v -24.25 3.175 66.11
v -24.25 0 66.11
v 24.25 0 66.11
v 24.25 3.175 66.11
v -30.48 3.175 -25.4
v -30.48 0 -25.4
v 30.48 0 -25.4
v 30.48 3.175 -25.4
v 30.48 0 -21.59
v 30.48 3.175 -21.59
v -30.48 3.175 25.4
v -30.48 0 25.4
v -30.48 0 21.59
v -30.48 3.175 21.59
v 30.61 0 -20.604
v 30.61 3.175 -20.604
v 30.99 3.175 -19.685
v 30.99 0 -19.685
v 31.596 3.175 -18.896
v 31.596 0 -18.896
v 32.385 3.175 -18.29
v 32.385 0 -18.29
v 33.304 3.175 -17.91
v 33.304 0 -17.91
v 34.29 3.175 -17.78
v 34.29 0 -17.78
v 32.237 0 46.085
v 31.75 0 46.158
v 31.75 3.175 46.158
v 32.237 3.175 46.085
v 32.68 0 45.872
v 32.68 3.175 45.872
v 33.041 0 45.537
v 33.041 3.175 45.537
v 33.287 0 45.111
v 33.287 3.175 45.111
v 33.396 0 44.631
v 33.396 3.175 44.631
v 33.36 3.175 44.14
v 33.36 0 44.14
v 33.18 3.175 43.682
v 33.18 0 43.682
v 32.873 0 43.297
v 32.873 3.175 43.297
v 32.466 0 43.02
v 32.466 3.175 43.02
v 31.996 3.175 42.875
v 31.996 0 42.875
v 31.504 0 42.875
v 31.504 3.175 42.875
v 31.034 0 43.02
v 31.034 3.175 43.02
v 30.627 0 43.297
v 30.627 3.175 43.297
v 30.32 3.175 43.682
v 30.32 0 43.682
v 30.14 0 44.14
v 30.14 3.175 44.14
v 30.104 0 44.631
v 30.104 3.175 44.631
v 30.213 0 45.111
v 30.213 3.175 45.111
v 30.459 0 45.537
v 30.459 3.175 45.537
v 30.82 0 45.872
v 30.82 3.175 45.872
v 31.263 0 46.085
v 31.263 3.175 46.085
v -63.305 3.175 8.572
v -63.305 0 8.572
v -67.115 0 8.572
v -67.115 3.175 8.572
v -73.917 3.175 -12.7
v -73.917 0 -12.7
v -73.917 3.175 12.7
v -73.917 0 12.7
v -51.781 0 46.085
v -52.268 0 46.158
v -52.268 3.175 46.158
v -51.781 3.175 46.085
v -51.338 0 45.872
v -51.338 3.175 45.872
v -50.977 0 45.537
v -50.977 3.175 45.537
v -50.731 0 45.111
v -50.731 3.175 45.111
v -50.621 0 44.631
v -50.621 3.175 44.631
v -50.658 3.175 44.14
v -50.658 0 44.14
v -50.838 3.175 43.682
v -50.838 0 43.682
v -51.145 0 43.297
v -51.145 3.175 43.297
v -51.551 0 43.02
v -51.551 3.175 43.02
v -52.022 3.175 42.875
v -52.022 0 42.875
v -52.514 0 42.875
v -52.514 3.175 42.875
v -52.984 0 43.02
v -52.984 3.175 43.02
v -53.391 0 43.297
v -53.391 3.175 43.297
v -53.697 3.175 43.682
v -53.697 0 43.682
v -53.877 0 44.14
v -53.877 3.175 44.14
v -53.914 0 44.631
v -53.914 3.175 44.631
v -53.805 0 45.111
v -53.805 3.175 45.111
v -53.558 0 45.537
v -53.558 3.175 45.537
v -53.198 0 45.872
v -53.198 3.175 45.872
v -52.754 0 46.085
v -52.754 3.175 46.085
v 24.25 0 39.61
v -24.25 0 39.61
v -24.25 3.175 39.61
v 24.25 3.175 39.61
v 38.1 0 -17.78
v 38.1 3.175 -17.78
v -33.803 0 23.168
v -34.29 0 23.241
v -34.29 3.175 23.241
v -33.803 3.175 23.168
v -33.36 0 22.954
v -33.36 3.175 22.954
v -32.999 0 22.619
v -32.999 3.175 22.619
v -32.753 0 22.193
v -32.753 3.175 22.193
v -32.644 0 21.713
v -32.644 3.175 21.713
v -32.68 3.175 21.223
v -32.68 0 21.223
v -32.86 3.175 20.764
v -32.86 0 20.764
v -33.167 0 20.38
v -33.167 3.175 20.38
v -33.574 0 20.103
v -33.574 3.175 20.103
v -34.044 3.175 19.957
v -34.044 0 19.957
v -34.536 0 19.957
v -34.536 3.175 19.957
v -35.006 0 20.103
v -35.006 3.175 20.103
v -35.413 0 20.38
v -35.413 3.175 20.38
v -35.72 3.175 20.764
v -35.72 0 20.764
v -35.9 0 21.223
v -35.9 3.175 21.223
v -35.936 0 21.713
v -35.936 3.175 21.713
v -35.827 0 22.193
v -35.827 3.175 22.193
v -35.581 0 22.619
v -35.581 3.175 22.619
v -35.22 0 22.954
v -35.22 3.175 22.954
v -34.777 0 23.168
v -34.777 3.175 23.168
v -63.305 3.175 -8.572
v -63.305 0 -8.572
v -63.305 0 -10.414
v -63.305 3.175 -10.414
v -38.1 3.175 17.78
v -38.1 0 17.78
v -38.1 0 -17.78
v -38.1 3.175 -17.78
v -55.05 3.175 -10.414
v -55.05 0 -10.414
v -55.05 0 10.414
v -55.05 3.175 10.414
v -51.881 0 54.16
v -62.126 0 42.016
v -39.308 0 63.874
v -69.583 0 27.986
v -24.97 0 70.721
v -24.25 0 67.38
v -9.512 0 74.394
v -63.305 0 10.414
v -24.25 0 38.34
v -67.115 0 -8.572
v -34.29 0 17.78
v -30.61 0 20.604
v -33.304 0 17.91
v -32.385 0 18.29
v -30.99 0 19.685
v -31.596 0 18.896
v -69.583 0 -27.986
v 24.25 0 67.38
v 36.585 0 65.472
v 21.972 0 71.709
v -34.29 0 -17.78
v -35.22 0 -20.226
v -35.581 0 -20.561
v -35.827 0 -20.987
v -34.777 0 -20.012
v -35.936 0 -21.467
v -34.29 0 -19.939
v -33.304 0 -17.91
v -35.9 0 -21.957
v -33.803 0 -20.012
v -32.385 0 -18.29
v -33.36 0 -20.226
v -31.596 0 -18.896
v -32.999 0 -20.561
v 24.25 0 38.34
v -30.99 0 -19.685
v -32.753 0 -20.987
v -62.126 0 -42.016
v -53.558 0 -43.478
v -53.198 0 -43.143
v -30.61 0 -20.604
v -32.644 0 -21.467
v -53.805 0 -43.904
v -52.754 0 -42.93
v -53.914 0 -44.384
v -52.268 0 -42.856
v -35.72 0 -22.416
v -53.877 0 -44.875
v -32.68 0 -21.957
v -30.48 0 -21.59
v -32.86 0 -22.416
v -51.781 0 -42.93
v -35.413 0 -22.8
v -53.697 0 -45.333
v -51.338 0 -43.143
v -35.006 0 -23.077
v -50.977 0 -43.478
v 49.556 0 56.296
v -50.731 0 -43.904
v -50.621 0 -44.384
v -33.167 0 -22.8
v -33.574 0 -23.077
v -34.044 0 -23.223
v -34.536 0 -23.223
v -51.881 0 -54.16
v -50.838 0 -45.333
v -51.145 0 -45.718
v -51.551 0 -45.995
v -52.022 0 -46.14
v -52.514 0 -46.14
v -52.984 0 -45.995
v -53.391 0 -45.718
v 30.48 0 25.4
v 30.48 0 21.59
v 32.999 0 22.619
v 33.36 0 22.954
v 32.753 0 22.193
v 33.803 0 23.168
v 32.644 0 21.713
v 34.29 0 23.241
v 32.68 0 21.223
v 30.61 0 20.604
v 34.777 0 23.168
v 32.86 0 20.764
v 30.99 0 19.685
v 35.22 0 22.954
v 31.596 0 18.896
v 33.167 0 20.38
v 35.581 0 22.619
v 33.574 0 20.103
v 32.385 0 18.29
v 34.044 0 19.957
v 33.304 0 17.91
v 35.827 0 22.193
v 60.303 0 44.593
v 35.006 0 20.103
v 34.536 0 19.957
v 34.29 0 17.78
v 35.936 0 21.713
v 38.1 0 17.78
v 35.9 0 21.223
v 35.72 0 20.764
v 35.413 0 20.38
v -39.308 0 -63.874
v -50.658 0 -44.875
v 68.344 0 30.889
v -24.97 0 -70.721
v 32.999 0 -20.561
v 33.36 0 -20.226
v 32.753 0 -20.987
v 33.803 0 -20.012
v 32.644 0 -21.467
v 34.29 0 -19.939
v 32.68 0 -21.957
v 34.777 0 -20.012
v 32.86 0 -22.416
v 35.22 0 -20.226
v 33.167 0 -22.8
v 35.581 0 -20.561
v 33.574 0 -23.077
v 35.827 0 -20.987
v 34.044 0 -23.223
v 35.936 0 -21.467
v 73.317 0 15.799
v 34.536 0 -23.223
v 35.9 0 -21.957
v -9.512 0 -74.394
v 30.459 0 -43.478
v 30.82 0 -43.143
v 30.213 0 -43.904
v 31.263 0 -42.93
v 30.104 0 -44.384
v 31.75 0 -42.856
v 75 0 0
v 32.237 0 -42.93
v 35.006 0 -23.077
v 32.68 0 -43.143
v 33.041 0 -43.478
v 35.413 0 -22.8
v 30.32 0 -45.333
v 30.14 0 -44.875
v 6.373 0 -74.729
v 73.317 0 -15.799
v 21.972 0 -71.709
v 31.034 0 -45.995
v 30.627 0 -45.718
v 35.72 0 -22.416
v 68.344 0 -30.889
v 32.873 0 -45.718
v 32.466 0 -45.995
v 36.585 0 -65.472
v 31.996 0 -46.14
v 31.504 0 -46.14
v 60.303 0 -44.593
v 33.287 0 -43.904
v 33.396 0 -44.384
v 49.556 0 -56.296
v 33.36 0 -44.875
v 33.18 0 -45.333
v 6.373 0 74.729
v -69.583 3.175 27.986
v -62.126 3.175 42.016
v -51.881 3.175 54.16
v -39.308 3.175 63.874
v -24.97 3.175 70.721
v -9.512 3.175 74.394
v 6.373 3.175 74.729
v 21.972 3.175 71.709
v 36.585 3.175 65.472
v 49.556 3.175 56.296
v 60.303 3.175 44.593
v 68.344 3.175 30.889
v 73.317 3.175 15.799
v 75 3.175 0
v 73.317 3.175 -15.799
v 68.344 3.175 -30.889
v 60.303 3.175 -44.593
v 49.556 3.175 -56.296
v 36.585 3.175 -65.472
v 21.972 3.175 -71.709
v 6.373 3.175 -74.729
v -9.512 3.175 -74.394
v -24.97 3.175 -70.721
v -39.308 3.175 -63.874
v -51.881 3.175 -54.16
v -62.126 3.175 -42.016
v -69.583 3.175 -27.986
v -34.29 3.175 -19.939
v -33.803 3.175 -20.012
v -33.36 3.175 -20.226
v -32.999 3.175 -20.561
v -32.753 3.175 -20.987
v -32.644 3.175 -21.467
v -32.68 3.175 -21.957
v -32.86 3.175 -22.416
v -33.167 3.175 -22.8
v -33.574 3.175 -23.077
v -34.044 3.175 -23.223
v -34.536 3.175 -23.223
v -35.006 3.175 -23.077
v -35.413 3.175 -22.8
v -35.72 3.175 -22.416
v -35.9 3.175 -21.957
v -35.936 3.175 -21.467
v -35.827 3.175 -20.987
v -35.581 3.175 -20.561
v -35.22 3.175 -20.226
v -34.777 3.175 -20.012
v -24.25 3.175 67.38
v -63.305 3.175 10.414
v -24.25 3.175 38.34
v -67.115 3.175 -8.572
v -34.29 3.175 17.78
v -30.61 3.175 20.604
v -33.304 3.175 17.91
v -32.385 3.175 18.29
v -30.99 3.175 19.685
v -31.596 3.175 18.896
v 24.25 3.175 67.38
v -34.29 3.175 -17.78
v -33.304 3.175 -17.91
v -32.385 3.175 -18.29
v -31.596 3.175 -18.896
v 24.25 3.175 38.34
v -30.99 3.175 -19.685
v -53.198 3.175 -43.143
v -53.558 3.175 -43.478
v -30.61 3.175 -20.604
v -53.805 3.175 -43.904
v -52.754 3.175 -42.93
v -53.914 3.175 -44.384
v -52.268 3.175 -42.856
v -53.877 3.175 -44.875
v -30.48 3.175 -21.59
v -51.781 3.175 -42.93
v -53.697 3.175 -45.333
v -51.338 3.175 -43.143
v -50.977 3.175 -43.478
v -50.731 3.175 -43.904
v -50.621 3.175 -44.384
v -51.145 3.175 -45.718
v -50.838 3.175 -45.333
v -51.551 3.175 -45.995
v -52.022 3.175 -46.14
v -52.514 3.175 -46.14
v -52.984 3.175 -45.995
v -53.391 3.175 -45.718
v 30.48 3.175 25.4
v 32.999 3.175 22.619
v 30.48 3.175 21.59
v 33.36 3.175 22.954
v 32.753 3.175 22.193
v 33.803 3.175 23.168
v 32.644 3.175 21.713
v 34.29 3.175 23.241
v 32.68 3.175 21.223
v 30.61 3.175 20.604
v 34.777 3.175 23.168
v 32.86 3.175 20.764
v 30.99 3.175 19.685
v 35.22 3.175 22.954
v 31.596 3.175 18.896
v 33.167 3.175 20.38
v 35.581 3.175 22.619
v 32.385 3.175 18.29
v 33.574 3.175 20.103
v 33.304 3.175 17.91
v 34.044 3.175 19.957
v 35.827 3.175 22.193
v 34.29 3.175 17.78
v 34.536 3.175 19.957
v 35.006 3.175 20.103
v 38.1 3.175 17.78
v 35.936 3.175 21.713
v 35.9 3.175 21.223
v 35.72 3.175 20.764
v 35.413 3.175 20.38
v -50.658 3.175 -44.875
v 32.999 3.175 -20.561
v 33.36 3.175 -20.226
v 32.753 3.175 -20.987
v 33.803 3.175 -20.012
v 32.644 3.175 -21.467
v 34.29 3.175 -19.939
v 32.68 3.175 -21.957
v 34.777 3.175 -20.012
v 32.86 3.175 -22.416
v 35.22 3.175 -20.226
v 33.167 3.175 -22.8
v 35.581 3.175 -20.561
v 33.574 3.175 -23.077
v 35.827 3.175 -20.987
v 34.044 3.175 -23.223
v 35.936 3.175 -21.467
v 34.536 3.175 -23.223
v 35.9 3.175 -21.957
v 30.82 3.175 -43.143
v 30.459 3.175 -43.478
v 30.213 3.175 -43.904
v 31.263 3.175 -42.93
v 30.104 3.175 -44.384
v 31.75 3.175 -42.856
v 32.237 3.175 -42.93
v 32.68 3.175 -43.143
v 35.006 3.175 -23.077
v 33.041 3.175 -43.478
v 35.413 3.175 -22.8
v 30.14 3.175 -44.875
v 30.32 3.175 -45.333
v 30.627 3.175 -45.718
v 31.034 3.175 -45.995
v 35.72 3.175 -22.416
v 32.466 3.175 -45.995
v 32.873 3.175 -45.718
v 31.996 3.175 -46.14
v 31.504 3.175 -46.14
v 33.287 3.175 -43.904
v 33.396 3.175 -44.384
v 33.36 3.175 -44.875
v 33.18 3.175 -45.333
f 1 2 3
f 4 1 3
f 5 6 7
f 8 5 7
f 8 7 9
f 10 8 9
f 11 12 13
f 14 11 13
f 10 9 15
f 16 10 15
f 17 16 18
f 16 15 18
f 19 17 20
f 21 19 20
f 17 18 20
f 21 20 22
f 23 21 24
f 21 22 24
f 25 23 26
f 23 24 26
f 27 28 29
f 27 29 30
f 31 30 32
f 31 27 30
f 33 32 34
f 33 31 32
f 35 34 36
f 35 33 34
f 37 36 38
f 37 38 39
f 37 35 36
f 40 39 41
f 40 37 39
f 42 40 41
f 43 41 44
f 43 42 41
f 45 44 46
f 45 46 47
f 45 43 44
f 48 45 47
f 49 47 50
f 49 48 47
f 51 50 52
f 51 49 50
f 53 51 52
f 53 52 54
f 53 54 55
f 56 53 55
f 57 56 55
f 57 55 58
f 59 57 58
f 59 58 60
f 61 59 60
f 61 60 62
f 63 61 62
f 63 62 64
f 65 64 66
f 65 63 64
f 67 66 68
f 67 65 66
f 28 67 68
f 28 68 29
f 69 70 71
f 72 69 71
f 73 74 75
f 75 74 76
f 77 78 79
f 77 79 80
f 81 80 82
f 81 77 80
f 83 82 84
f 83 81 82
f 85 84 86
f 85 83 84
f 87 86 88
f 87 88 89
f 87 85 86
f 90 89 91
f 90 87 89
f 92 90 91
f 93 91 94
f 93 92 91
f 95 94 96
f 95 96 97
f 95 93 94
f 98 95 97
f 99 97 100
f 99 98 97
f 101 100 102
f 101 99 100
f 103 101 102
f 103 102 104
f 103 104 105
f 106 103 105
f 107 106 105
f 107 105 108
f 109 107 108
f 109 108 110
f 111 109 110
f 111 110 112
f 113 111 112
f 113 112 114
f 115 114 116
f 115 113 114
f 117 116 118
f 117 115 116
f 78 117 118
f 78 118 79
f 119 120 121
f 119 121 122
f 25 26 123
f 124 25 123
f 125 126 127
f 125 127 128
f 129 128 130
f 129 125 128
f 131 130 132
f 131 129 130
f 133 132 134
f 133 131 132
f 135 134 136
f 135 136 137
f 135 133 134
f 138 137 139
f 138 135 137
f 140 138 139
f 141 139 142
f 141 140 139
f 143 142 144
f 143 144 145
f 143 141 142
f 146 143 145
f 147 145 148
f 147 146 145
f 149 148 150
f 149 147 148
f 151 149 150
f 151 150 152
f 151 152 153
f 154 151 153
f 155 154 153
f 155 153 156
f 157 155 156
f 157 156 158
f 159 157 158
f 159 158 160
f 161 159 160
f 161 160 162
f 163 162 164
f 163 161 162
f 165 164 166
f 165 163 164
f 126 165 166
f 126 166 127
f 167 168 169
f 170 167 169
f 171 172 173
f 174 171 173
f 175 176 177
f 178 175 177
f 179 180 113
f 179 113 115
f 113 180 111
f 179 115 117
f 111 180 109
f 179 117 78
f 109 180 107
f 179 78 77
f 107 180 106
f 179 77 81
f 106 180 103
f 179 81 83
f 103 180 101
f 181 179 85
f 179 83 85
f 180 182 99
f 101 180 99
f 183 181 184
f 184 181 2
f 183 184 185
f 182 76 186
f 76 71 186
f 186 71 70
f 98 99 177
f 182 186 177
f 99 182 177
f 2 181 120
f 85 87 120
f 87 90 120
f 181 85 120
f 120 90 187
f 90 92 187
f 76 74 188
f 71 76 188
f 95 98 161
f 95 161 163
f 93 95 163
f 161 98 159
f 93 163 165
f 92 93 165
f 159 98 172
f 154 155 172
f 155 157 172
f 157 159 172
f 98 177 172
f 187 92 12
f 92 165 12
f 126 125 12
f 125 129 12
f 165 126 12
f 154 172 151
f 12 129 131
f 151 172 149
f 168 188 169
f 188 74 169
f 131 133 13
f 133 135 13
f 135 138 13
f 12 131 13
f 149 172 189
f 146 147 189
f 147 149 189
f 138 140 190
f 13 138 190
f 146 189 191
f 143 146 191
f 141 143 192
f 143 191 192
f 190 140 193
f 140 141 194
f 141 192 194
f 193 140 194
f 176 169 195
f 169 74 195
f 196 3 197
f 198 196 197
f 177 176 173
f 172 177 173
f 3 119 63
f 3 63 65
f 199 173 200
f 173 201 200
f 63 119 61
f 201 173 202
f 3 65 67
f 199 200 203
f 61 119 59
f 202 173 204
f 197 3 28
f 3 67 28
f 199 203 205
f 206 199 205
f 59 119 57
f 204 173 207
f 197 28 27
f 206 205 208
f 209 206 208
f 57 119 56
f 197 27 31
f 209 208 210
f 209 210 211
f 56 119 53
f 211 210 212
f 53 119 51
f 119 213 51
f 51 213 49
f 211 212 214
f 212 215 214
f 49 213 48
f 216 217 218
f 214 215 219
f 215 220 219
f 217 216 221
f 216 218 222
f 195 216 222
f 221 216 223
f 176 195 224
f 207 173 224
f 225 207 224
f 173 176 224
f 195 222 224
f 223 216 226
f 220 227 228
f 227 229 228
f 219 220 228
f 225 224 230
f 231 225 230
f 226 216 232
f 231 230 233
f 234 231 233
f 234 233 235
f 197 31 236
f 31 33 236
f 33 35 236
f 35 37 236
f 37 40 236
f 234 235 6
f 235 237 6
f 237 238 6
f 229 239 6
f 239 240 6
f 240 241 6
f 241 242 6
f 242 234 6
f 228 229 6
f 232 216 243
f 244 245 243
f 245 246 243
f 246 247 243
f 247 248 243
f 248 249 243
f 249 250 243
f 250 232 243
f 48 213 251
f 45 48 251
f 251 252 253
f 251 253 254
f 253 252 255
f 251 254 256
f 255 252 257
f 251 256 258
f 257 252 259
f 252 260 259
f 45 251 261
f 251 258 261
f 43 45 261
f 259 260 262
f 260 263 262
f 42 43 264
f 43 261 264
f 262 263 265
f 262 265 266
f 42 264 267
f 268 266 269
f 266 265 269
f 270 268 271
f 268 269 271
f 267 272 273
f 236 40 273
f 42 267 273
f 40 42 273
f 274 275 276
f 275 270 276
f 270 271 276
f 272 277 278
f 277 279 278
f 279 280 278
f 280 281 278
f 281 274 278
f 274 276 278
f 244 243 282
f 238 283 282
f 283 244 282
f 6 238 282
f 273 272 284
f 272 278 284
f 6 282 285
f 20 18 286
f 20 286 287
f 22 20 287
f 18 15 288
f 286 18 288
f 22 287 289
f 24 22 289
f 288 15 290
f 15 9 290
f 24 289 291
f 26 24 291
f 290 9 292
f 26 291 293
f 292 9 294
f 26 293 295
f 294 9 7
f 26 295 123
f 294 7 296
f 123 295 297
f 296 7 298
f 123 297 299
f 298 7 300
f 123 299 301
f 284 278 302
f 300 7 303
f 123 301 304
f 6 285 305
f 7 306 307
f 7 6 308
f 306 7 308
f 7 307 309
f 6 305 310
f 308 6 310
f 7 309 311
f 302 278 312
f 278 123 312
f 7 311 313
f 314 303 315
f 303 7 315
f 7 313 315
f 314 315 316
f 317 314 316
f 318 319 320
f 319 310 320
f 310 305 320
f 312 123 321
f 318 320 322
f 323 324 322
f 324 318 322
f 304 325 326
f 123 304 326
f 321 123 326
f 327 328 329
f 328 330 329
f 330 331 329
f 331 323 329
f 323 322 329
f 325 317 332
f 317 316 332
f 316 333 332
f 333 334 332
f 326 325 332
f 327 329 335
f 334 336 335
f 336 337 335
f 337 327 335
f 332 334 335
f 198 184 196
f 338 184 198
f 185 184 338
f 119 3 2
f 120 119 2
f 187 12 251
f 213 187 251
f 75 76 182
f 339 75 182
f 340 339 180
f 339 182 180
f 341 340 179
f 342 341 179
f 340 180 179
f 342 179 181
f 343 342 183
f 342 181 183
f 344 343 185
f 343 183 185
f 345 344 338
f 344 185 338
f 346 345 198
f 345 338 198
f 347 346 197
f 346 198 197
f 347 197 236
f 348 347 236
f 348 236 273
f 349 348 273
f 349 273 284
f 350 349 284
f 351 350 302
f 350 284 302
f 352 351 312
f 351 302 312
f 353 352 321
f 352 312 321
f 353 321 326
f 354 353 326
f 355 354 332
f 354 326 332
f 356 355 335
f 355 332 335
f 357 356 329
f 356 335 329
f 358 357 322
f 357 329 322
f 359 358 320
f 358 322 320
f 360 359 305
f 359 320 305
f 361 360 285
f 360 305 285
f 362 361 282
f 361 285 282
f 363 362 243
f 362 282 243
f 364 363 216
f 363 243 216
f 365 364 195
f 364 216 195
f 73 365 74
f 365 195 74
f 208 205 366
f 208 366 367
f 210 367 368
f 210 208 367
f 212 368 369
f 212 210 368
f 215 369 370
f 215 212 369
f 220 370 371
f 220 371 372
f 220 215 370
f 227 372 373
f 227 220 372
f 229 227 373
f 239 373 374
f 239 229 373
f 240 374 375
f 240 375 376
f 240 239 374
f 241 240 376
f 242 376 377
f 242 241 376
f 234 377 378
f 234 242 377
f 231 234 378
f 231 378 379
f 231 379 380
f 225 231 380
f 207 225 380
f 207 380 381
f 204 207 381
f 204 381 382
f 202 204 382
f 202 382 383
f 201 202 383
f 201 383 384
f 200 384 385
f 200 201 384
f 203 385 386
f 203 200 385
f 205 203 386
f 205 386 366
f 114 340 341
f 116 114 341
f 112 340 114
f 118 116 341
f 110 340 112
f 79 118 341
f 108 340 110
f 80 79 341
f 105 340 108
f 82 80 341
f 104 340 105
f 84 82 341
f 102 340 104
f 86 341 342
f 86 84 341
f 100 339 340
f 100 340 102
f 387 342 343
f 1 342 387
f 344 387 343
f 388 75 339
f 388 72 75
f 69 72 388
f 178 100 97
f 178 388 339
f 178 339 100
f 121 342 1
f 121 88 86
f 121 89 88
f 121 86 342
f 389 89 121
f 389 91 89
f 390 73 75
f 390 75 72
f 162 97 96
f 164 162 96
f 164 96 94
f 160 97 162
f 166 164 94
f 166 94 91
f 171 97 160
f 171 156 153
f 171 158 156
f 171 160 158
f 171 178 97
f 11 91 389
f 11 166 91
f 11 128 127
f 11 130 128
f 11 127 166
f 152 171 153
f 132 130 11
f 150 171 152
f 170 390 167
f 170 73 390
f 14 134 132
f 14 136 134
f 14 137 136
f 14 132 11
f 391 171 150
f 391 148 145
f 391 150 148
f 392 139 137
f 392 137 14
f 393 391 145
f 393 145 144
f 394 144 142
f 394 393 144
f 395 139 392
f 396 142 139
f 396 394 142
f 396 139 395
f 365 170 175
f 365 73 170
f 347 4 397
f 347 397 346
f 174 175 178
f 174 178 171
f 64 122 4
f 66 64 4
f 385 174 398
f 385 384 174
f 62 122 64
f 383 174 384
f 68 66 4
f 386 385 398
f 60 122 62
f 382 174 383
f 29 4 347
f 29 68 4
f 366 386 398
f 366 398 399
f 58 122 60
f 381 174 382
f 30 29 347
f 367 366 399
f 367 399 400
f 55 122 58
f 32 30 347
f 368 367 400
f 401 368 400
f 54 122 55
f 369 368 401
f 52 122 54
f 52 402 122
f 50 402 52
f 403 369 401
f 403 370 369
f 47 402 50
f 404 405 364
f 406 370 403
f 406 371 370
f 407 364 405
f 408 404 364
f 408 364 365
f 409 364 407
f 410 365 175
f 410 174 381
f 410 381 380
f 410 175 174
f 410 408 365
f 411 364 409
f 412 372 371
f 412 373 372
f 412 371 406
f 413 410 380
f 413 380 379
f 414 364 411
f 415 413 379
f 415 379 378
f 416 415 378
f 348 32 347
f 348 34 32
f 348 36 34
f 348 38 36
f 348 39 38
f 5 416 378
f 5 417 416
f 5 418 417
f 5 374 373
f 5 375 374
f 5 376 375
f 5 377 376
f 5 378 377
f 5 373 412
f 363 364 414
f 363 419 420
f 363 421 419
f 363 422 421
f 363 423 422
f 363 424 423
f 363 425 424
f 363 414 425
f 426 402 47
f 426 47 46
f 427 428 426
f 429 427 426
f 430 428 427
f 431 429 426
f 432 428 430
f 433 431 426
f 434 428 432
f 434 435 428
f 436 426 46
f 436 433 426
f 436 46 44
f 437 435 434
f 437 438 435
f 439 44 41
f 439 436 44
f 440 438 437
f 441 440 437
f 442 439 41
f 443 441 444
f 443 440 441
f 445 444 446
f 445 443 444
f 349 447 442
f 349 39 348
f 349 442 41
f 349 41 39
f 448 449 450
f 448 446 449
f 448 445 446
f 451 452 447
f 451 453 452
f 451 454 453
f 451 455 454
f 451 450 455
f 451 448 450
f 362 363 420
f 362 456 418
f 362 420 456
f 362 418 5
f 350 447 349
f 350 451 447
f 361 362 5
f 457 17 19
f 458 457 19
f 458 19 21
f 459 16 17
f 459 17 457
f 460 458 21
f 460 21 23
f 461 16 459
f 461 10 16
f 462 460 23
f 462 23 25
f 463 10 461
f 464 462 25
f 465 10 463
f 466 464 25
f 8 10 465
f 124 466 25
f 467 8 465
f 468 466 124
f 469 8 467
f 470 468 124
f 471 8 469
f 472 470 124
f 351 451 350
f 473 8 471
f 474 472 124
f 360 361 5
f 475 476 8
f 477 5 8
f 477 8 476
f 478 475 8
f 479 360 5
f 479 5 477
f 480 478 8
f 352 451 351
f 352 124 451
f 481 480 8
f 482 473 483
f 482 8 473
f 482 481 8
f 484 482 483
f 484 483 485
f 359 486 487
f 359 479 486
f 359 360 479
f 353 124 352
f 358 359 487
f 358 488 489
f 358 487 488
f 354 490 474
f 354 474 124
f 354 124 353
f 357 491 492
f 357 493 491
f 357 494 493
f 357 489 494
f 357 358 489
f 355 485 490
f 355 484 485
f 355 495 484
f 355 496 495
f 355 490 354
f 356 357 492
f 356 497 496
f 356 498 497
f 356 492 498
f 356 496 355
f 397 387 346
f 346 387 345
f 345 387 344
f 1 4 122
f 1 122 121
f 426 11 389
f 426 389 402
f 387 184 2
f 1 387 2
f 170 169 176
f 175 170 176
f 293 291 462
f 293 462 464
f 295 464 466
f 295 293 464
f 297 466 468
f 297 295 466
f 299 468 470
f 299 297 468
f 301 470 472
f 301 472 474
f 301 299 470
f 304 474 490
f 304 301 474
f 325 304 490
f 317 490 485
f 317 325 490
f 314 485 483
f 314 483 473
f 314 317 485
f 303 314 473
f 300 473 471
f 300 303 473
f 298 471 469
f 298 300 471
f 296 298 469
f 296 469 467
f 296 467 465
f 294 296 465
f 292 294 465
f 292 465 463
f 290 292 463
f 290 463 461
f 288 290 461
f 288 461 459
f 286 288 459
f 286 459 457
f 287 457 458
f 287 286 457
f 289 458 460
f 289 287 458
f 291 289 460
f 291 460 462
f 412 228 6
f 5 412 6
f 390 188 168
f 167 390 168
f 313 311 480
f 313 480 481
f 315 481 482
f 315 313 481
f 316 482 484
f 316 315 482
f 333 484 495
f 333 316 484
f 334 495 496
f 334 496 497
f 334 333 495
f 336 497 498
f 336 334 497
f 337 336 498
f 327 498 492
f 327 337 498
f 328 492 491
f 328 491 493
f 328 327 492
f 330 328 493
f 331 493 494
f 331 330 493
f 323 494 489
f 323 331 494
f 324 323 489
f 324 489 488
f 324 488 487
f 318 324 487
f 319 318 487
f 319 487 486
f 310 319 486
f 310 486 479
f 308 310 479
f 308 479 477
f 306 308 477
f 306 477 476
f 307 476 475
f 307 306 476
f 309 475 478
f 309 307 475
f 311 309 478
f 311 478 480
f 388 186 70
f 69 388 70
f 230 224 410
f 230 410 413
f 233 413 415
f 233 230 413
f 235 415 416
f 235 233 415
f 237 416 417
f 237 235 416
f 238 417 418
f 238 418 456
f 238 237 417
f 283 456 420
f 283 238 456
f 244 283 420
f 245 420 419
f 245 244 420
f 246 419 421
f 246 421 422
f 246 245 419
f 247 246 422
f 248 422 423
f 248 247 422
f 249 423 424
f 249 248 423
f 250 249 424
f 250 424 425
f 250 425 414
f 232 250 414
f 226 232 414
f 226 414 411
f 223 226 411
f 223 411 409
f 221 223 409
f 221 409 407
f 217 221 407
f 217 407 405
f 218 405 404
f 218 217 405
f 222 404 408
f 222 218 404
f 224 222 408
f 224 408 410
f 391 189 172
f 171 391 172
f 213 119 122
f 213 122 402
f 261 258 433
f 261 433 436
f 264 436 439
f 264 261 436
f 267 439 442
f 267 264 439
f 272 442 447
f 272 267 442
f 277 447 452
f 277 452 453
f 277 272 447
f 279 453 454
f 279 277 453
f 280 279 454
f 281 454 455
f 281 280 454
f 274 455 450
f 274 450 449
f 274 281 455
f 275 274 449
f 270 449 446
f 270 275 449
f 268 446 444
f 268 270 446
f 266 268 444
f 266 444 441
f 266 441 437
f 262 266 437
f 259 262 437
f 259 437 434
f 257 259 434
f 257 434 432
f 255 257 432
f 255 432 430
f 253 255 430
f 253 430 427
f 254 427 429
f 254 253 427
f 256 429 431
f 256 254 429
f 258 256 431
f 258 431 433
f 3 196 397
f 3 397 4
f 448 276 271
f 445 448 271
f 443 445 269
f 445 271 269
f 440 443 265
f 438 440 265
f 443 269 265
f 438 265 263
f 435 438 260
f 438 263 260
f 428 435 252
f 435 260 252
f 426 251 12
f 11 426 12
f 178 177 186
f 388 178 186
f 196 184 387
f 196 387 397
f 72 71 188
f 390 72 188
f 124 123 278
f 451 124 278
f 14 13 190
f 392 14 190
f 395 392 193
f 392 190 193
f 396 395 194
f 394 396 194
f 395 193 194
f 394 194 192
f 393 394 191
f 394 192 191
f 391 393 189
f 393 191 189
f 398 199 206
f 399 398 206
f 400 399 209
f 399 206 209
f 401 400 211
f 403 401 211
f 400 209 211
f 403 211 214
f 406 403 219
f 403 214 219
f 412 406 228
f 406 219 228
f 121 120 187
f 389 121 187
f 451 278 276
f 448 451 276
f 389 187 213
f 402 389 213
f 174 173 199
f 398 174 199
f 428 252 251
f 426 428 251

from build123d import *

# Parameters (mm, degrees)
SKETCH1_R           = 1.651
SKETCH1_W           = 48.5
SKETCH1_H           = 1.27
BOSS_EXTRUDE1_DEPTH = 3.175


with BuildPart() as part:
    # Sketch1 → Boss-Extrude1 (new body)
    with BuildSketch(Plane(origin=(0, 0, 0), x_dir=(1, 0, 0), z_dir=(0, 1, 0))):
        with BuildLine():
            Line((-73.916912814, 12.7), (-73.916912814, -12.7))
            ThreePointArc((-73.916912814, -12.7), (75, 0), (-73.916912814, 12.7))
        make_face()
        with Locations(Location((-52.26766059, -44.507461806, 0), (0, 0, 270))):
            Circle(SKETCH1_R, mode=Mode.SUBTRACT)
        with Locations(Location((31.75, -44.507461806, 0), (0, 0, 270))):
            Circle(SKETCH1_R, mode=Mode.SUBTRACT)
        with Locations(Location((31.75, 44.507461806, 0), (0, 0, 270))):
            Circle(SKETCH1_R, mode=Mode.SUBTRACT)
        with Locations(Location((-52.26766059, 44.507461806, 0), (0, 0, 270))):
            Circle(SKETCH1_R, mode=Mode.SUBTRACT)
        with Locations(Location((34.29, 21.59, 0), (0, 0, 270))):
            Circle(SKETCH1_R, mode=Mode.SUBTRACT)
        with Locations(Location((34.29, -21.59, 0), (0, 0, 270))):
            Circle(SKETCH1_R, mode=Mode.SUBTRACT)
        with Locations(Location((-34.29, -21.59, 0), (0, 0, 270))):
            Circle(SKETCH1_R, mode=Mode.SUBTRACT)
        with Locations(Location((-34.29, 21.59, 0), (0, 0, 270))):
            Circle(SKETCH1_R, mode=Mode.SUBTRACT)
        with BuildLine():
            Line((-30.48, 21.59), (-30.48, 25.4))
            Line((-30.48, 25.4), (30.48, 25.4))
            Line((30.48, 25.4), (30.48, 21.59))
            ThreePointArc((30.48, 21.59), (31.595923164, 18.895923164), (34.29, 17.78))
            Line((34.29, 17.78), (38.1, 17.78))
            Line((38.1, 17.78), (38.1, -17.78))
            Line((38.1, -17.78), (34.29, -17.78))
            ThreePointArc((34.29, -17.78), (31.595923164, -18.895923164), (30.48, -21.59))
            Line((30.48, -21.59), (30.48, -25.4))
            Line((30.48, -25.4), (-30.48, -25.4))
            Line((-30.48, -25.4), (-30.48, -21.59))
            ThreePointArc((-30.48, -21.59), (-31.595923164, -18.895923164), (-34.29, -17.78))
            Line((-34.29, -17.78), (-38.1, -17.78))
            Line((-38.1, -17.78), (-38.1, 17.78))
            Line((-38.1, 17.78), (-34.29, 17.78))
            ThreePointArc((-34.29, 17.78), (-31.595923164, 18.895923164), (-30.48, 21.59))
        make_face(mode=Mode.SUBTRACT)
        Polygon((-67.114917129, 8.5725), (-63.304917129, 8.5725), (-63.304917129, 10.414), (-55.049917129, 10.414), (-55.049917129, 8.5725), (-55.049917129, -8.5725), (-55.049917129, -10.414), (-63.304917129, -10.414), (-63.304917129, -8.5725), (-67.114917129, -8.5725), align=None, mode=Mode.SUBTRACT)
        with Locations((0, -38.975)):
            Rectangle(SKETCH1_W, SKETCH1_H, mode=Mode.SUBTRACT)
        with Locations((0, -66.745)):
            Rectangle(SKETCH1_W, SKETCH1_H, mode=Mode.SUBTRACT)
    extrude(amount=BOSS_EXTRUDE1_DEPTH)


solid = part.part
